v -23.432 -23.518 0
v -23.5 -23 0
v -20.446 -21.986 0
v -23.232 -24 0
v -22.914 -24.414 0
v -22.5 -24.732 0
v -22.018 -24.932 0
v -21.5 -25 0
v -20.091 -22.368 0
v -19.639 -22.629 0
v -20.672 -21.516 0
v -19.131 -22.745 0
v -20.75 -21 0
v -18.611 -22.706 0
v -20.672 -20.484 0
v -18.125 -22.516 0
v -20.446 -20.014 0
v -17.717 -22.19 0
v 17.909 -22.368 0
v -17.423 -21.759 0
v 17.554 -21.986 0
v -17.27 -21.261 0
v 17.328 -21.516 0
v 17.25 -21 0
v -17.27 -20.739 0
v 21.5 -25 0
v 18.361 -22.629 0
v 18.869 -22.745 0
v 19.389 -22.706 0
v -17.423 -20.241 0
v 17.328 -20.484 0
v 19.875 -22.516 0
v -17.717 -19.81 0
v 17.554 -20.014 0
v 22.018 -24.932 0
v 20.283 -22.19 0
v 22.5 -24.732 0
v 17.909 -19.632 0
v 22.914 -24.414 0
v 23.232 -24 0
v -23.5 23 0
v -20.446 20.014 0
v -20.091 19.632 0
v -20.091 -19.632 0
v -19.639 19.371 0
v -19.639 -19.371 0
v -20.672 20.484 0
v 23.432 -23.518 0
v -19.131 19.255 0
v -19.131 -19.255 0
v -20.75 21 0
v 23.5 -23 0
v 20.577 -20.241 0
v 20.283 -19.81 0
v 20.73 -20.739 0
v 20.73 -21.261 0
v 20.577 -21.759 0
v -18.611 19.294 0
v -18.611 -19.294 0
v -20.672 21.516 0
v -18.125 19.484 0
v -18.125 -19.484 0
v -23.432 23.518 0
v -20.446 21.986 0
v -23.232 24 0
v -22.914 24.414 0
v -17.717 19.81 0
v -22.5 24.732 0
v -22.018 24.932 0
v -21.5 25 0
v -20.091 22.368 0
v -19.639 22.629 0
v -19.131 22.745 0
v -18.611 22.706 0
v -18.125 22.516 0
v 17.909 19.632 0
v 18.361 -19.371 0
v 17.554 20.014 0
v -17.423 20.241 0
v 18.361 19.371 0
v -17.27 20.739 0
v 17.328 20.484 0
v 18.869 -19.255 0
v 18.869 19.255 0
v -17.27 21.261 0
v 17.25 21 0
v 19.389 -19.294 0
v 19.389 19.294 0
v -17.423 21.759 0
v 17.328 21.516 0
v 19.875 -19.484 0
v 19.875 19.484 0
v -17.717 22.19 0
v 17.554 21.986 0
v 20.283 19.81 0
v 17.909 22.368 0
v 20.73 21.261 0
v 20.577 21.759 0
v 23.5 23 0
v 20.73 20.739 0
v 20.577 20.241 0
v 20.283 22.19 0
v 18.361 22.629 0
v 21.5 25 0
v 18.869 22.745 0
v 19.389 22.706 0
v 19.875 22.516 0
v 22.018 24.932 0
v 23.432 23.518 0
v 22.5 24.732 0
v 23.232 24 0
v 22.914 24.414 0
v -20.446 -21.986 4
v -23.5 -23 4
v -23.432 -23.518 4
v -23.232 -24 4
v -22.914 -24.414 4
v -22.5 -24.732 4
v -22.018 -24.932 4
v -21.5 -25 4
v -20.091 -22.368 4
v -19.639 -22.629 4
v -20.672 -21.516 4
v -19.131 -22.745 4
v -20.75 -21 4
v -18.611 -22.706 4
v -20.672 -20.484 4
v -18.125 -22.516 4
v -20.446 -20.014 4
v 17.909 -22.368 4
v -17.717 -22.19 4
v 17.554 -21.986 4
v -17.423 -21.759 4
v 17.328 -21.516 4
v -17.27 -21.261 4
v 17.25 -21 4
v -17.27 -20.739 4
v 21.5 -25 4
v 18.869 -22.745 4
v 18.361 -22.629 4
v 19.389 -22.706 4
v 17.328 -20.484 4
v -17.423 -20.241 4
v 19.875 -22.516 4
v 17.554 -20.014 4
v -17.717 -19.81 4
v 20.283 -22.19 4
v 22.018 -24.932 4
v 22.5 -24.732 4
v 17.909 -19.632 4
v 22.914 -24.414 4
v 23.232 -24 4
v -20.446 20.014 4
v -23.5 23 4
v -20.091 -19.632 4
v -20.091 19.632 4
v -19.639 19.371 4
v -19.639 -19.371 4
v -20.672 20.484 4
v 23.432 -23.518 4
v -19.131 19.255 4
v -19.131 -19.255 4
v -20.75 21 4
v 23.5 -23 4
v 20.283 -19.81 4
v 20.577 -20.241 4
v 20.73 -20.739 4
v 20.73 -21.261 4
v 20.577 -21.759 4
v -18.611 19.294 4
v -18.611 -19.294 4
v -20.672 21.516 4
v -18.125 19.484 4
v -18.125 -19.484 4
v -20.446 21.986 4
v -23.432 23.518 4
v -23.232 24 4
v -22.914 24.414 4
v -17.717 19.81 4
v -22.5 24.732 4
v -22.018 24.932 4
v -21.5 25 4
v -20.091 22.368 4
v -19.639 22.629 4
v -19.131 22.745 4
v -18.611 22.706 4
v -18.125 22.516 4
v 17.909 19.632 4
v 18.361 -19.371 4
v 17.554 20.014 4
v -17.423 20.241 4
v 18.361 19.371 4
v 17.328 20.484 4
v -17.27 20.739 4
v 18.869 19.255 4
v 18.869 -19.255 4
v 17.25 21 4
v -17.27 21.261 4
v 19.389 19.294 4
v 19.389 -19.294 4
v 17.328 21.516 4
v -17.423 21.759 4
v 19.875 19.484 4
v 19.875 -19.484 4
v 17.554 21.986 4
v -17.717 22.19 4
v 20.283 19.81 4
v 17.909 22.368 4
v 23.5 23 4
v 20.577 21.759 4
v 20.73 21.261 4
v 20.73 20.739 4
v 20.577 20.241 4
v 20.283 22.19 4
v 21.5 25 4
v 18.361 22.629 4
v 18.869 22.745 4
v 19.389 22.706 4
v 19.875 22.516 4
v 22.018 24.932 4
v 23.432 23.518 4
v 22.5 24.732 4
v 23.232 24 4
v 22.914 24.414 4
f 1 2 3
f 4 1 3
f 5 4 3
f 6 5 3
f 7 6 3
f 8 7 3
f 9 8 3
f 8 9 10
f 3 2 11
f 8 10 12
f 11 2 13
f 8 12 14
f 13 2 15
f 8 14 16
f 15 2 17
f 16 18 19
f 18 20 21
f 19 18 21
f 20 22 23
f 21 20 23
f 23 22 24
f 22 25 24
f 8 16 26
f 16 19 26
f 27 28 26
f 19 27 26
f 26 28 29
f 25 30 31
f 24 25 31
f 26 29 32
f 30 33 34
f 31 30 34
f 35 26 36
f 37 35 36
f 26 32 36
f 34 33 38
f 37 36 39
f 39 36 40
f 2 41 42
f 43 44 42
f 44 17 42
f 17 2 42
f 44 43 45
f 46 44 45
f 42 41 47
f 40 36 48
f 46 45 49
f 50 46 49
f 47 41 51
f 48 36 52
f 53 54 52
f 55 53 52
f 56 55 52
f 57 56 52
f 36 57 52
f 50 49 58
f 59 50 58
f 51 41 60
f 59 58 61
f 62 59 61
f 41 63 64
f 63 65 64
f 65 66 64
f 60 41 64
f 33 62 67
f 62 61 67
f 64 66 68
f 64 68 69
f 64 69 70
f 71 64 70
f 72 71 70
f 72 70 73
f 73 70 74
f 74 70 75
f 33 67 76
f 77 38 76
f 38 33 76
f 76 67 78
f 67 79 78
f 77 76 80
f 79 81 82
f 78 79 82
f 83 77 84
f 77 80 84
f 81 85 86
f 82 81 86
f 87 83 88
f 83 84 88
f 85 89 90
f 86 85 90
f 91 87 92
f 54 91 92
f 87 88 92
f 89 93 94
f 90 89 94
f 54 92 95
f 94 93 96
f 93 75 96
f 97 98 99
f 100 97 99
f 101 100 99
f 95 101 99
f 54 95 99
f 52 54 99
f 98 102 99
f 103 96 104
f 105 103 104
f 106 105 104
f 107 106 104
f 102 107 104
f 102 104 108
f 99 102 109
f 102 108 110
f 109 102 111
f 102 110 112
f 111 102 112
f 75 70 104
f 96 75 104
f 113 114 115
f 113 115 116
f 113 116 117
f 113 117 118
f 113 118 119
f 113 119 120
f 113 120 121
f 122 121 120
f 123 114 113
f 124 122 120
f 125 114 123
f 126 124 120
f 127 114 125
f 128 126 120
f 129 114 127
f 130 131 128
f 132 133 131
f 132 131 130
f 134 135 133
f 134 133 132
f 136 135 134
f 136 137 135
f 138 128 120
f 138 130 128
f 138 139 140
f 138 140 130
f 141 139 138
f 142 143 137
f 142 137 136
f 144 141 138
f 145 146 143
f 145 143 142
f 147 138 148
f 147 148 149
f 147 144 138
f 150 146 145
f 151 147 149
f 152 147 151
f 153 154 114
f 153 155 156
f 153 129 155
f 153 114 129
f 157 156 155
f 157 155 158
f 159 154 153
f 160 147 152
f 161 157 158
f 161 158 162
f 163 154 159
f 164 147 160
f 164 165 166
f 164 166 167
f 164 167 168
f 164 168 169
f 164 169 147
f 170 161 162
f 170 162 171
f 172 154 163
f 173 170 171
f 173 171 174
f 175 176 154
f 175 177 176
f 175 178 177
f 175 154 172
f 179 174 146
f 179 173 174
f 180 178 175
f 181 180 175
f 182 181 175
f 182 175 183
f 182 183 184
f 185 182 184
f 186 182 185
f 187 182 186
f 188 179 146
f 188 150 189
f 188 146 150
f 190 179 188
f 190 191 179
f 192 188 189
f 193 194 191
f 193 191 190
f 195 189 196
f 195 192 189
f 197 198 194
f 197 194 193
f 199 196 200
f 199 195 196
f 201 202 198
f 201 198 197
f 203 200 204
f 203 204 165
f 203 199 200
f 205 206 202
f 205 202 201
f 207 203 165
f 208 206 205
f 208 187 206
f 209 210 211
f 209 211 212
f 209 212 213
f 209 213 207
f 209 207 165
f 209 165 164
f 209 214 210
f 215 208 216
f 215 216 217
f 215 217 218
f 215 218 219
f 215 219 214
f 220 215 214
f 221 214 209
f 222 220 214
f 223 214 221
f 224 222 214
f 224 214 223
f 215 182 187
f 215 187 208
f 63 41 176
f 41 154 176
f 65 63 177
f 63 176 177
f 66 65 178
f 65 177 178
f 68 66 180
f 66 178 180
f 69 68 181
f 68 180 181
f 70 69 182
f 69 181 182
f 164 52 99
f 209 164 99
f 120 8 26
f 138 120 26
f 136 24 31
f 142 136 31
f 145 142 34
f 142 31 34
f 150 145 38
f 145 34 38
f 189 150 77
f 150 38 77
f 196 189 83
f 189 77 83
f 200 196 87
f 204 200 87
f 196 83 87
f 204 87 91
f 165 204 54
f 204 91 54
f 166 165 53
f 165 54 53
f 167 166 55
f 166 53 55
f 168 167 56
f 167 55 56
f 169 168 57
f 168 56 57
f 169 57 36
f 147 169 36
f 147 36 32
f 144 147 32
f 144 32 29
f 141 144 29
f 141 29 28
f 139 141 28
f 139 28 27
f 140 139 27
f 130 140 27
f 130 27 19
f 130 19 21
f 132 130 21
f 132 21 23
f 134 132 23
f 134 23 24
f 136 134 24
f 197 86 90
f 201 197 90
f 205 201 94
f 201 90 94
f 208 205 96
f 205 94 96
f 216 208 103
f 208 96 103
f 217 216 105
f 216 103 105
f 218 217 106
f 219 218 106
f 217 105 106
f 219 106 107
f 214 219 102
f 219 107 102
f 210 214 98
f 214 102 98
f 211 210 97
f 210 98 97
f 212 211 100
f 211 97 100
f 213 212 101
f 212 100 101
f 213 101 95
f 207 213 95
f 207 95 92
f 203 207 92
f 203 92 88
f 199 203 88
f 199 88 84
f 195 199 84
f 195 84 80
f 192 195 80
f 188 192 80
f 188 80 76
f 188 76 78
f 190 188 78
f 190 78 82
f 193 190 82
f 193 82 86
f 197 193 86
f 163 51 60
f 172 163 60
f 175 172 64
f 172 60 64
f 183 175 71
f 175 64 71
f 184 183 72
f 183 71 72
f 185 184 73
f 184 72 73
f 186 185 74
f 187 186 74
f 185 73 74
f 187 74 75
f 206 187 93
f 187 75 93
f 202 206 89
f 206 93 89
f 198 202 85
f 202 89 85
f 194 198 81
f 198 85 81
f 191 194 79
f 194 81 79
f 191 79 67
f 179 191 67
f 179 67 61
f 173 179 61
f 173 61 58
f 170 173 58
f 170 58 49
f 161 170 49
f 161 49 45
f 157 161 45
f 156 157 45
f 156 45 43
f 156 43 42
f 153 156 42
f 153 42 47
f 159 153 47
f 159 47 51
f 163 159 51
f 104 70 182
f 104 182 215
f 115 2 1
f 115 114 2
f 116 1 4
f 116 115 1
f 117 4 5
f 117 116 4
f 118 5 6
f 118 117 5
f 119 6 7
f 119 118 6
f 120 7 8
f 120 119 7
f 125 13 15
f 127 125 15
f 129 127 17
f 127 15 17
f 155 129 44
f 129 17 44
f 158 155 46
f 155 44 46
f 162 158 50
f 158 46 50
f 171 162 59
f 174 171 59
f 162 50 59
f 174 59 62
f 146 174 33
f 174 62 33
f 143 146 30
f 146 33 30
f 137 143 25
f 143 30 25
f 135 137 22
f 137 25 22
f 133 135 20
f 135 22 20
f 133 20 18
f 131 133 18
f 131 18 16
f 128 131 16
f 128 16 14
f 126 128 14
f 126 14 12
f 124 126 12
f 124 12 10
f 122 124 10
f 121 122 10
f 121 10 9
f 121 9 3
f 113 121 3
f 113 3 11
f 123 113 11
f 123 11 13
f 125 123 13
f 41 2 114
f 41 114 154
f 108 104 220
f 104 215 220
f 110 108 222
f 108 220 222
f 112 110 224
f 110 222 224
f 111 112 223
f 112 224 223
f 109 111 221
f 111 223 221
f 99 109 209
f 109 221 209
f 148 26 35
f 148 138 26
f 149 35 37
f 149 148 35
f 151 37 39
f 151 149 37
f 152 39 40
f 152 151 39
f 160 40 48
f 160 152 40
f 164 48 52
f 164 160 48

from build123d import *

# Parameters (mm, degrees)
SKETCH_1_W                  = 47
SKETCH_1_H                  = 50
EXTRUDE_1_DEPTH             = 4
HOLE_WIZARD_3_5_3_5_1_D     = 3.5
HOLE_WIZARD_3_5_3_5_1_DEPTH = 4
FILLET_1_R                  = 2


with BuildPart() as part:
    # 草图1 → 凸台-拉伸1 (new body)
    with BuildSketch(Plane.XY):
        Rectangle(SKETCH_1_W, SKETCH_1_H)
    extrude(amount=EXTRUDE_1_DEPTH)

    # Ø3.5 (3.5) 直径孔1
    with Locations(Plane.XY.offset(4)):
        with Locations((-19, 21), (19, 21), (-19, -21), (19, -21)):
            Hole(HOLE_WIZARD_3_5_3_5_1_D / 2, depth=HOLE_WIZARD_3_5_3_5_1_DEPTH)

    # 圆角1
    fillet_1_edges = [part.edges().sort_by_distance(p)[0] for p in [
        (23.5, -25, 2),
        (-23.5, -25, 2),
        (-23.5, 25, 2),
        (23.5, 25, 2),
    ]]
    fillet(fillet_1_edges, radius=FILLET_1_R)


solid = part.part
